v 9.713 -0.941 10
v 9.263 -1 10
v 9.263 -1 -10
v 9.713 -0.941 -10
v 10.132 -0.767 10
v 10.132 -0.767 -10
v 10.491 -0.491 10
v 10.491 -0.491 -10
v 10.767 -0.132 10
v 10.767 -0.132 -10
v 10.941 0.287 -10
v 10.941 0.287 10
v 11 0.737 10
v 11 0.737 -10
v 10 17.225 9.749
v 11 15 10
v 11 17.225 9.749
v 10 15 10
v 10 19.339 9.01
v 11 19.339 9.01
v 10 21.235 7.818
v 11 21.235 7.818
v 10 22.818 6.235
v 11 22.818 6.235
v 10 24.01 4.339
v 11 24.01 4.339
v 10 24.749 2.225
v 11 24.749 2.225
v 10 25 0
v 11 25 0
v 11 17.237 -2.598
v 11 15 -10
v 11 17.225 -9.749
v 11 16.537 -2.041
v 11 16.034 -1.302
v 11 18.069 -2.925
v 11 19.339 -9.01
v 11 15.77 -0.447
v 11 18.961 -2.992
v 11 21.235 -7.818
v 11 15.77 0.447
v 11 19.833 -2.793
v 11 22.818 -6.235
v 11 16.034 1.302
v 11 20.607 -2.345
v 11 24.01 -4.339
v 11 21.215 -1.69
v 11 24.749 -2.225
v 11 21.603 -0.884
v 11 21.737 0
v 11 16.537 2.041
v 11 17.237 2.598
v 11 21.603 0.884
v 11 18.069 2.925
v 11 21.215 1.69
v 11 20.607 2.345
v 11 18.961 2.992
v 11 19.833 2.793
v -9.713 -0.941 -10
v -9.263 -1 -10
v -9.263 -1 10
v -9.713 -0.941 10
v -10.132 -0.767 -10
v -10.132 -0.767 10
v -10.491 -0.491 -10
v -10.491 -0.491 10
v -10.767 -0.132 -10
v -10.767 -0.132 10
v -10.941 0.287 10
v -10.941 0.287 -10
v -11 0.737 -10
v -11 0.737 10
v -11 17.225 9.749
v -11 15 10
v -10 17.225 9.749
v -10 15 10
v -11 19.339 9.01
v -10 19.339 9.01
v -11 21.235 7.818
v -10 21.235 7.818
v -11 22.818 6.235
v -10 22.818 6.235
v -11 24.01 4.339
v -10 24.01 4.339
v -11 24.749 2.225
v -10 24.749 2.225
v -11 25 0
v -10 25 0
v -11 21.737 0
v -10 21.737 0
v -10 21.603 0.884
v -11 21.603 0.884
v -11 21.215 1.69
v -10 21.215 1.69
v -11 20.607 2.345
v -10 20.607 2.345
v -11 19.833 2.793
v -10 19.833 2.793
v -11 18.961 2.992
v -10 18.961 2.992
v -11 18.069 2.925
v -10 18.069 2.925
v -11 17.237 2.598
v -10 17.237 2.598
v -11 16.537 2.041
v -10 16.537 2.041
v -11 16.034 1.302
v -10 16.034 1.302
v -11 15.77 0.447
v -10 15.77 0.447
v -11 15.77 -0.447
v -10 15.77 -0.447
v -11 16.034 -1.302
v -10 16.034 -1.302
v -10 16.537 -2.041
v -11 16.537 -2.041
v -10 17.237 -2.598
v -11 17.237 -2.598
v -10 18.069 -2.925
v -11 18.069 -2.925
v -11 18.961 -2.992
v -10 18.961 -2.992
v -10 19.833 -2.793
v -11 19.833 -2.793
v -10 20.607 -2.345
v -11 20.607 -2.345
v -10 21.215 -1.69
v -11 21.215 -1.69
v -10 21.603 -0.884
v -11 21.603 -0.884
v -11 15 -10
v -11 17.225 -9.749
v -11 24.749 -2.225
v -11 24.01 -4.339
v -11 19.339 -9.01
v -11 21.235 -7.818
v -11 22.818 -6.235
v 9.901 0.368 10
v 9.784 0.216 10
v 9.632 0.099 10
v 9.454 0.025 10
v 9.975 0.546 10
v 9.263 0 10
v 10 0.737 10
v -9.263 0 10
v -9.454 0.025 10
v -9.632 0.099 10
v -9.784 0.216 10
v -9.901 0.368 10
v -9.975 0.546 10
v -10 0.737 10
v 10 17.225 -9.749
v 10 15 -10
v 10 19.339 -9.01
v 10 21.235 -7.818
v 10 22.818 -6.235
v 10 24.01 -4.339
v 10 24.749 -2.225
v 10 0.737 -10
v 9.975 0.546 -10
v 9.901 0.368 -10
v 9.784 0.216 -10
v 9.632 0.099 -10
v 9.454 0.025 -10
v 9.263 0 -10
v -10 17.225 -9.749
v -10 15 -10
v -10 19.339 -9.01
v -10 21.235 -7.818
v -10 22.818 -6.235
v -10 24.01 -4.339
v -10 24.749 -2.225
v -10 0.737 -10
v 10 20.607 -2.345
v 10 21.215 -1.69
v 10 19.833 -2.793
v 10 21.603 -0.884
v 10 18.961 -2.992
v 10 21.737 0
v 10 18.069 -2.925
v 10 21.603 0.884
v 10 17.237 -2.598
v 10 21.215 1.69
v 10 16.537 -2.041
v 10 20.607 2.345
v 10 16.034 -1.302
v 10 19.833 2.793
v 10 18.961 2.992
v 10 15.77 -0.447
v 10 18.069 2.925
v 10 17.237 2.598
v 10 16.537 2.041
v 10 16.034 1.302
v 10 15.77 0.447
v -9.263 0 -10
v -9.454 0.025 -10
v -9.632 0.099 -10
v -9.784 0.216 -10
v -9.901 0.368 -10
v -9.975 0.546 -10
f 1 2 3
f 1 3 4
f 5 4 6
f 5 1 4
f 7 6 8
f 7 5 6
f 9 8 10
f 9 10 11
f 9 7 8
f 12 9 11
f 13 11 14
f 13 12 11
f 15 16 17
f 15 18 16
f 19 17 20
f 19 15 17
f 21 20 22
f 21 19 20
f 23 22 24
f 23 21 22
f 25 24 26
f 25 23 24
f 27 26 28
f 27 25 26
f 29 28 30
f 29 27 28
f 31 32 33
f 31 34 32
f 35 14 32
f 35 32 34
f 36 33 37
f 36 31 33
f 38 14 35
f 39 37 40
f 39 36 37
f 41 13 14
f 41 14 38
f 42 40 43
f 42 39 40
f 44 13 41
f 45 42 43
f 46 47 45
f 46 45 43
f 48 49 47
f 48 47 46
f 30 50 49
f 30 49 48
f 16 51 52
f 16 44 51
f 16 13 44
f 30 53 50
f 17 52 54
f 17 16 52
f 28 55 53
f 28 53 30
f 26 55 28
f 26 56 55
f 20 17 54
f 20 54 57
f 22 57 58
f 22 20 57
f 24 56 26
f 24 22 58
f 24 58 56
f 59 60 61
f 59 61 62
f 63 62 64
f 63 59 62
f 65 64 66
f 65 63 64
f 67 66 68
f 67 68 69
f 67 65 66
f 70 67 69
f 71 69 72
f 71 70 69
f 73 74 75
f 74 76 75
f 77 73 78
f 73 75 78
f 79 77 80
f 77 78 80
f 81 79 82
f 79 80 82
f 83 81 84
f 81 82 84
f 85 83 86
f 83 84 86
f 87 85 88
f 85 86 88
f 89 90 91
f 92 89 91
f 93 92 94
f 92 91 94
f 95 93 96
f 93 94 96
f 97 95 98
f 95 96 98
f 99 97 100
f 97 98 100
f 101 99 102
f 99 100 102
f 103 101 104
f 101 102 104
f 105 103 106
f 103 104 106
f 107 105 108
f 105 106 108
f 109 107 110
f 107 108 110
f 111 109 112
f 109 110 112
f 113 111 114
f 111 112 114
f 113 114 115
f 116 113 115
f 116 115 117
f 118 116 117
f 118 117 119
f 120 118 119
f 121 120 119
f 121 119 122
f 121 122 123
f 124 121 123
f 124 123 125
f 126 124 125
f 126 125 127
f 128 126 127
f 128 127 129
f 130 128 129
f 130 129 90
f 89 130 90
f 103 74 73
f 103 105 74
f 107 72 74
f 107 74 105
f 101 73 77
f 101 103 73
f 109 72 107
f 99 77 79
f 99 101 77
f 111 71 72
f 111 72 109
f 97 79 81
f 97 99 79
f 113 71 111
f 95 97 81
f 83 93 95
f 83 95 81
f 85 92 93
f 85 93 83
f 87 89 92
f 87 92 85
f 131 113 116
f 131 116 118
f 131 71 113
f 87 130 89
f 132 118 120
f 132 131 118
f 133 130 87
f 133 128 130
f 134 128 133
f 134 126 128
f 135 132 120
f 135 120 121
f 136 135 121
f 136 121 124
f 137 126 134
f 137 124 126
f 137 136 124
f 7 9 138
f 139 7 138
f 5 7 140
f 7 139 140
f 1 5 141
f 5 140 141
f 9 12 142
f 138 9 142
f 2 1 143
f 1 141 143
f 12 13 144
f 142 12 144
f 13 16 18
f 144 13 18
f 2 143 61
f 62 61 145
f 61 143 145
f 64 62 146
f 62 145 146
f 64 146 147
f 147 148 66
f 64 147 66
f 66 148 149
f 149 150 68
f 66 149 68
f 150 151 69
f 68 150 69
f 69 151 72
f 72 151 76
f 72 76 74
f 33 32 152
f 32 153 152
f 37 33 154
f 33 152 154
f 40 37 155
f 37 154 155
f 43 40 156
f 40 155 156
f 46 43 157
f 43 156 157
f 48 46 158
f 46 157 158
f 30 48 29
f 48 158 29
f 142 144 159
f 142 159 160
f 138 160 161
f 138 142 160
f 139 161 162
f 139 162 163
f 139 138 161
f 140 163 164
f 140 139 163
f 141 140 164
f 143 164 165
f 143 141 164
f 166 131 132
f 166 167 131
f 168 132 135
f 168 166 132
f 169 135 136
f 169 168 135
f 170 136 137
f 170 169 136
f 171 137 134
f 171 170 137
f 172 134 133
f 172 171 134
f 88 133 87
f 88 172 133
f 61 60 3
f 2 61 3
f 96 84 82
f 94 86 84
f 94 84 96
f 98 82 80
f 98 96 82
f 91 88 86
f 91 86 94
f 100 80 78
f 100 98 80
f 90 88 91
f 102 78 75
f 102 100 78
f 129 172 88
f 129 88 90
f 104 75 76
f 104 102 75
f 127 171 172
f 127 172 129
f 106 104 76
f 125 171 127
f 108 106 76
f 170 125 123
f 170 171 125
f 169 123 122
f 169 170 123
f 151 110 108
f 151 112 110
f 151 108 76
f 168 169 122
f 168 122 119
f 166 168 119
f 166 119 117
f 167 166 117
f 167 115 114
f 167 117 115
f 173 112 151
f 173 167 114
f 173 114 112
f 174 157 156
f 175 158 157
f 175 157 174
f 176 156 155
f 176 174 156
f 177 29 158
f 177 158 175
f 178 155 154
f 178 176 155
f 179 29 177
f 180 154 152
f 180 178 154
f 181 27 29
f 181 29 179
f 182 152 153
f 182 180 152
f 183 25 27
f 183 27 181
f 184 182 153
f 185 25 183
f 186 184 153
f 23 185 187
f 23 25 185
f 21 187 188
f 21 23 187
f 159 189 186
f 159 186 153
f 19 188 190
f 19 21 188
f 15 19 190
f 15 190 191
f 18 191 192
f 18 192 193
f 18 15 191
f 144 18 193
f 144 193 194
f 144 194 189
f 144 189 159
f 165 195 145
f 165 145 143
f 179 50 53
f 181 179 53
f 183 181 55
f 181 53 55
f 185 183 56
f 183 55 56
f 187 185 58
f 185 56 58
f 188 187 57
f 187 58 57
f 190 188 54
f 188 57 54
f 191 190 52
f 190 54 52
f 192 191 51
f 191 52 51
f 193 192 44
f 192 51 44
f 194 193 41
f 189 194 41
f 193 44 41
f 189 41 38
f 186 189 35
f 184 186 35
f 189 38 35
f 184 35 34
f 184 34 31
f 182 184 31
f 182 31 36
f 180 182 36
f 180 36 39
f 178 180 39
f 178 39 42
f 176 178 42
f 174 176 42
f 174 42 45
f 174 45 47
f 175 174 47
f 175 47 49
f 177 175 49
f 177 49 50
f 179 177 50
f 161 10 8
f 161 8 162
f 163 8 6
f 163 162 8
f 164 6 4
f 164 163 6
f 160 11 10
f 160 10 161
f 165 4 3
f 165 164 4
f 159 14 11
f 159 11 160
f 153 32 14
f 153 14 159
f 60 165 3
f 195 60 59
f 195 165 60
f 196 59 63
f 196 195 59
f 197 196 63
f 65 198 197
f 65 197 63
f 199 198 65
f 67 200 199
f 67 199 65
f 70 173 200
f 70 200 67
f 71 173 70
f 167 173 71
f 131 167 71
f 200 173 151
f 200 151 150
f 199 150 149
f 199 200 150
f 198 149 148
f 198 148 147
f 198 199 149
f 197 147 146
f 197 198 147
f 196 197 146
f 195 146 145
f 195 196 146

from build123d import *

# Parameters (mm, degrees)
CROQUIS1_W                         = 20
CROQUIS1_H                         = 20
BRIDA_BASE1_DEPTH                  = 1
BRIDA_DE_ARISTA1_STRIP_W           = 5.4732
BRIDA_DE_ARISTA1_STRIP_H           = 1
BRIDA_DE_ARISTA1_STRIP_CUT_DEPTH   = 20
BRIDA_DE_ARISTA1_STRIP_2_W         = 5.4732
BRIDA_DE_ARISTA1_STRIP_2_H         = 1
BRIDA_DE_ARISTA1_STRIP_CUT_2_DEPTH = 20
BRIDA_DE_ARISTA1_DEPTH             = 20
BRIDA_DE_ARISTA1_BEND_DEPTH        = 20
CROQUIS12_R                        = 3
CORTAR_EXTRUIR1_DEPTH              = 35.770677301
REDONDEO1_R                        = 10


# Sheet-metal steps are written as plain solids
with BuildPart() as part:
    # Croquis1 → Brida base1 (new body)
    with BuildSketch(Plane(origin=(0, 0, 0), x_dir=(1, 0, 0), z_dir=(0, 1, 0))):
        Rectangle(CROQUIS1_W, CROQUIS1_H)
    extrude(amount=-BRIDA_BASE1_DEPTH)

    # Brida de arista1 strip (across the edge) → Brida de arista1 strip cut (cut)
    with BuildSketch(Plane(origin=(10, 0, 10), x_dir=(-1, 0, 0), z_dir=(0, 0, -1))):
        with Locations((-2, -0.5)):
            Rectangle(BRIDA_DE_ARISTA1_STRIP_W, BRIDA_DE_ARISTA1_STRIP_H)
    extrude(amount=BRIDA_DE_ARISTA1_STRIP_CUT_DEPTH, mode=Mode.SUBTRACT)

    # Brida de arista1 strip 2 (across the edge) → Brida de arista1 strip cut 2 (cut)
    with BuildSketch(Plane(origin=(-10, 0, -10), x_dir=(1, 0, 0), z_dir=(0, 0, 1))):
        with Locations((-2, -0.5)):
            Rectangle(BRIDA_DE_ARISTA1_STRIP_2_W, BRIDA_DE_ARISTA1_STRIP_2_H)
    extrude(amount=BRIDA_DE_ARISTA1_STRIP_CUT_2_DEPTH, mode=Mode.SUBTRACT)

    # Brida de arista1 section (across the edge) → Brida de arista1 (add)
    with BuildSketch(Plane(origin=(10, 0, 10), x_dir=(-1, 0, 0), z_dir=(0, 0, -1))):
        with BuildLine():
            Line((-1, 0.7366), (-1, 25))
            Line((-1, 25), (0, 25))
            Line((0, 25), (0, 0.7366))
            ThreePointArc((0, 0.7366), (0.215745145, 0.215745145), (0.7366, 0))
            Line((0.7366, 0), (0.7366, -1))
            ThreePointArc((0.7366, -1), (-0.491361636, -0.491361636), (-1, 0.7366))
        make_face()
    extrude(amount=BRIDA_DE_ARISTA1_DEPTH)

    # Brida de arista1 section 2 (across the edge) → Brida de arista1 bend (add)
    with BuildSketch(Plane(origin=(-10, 0, -10), x_dir=(1, 0, 0), z_dir=(0, 0, 1))):
        with BuildLine():
            Line((-1, 0.7366), (-1, 25))
            Line((-1, 25), (0, 25))
            Line((0, 25), (0, 0.7366))
            ThreePointArc((0, 0.7366), (0.215745145, 0.215745145), (0.7366, 0))
            Line((0.7366, 0), (0.7366, -1))
            ThreePointArc((0.7366, -1), (-0.491361636, -0.491361636), (-1, 0.7366))
        make_face()
    extrude(amount=BRIDA_DE_ARISTA1_BEND_DEPTH)

    # Croquis12 → Cortar-Extruir1 (cut, through all)
    with BuildSketch(Plane(origin=(11, 0, 0), x_dir=(0, 0, -1), z_dir=(1, 0, 0))):
        with Locations(Location((0, 18.7366, 0), (0, 0, 90))):
            Circle(CROQUIS12_R)
    extrude(amount=-CORTAR_EXTRUIR1_DEPTH, mode=Mode.SUBTRACT)

    # Redondeo1
    redondeo1_edges = [part.edges().sort_by_distance(p)[0] for p in [
        (-10.5, 25, -10),
        (10.5, 25, -10),
        (10.5, 25, 10),
        (-10.5, 25, 10),
    ]]
    fillet(redondeo1_edges, radius=REDONDEO1_R - 0.0001)  # a hair under: the kernel refuses the full size


solid = part.part
